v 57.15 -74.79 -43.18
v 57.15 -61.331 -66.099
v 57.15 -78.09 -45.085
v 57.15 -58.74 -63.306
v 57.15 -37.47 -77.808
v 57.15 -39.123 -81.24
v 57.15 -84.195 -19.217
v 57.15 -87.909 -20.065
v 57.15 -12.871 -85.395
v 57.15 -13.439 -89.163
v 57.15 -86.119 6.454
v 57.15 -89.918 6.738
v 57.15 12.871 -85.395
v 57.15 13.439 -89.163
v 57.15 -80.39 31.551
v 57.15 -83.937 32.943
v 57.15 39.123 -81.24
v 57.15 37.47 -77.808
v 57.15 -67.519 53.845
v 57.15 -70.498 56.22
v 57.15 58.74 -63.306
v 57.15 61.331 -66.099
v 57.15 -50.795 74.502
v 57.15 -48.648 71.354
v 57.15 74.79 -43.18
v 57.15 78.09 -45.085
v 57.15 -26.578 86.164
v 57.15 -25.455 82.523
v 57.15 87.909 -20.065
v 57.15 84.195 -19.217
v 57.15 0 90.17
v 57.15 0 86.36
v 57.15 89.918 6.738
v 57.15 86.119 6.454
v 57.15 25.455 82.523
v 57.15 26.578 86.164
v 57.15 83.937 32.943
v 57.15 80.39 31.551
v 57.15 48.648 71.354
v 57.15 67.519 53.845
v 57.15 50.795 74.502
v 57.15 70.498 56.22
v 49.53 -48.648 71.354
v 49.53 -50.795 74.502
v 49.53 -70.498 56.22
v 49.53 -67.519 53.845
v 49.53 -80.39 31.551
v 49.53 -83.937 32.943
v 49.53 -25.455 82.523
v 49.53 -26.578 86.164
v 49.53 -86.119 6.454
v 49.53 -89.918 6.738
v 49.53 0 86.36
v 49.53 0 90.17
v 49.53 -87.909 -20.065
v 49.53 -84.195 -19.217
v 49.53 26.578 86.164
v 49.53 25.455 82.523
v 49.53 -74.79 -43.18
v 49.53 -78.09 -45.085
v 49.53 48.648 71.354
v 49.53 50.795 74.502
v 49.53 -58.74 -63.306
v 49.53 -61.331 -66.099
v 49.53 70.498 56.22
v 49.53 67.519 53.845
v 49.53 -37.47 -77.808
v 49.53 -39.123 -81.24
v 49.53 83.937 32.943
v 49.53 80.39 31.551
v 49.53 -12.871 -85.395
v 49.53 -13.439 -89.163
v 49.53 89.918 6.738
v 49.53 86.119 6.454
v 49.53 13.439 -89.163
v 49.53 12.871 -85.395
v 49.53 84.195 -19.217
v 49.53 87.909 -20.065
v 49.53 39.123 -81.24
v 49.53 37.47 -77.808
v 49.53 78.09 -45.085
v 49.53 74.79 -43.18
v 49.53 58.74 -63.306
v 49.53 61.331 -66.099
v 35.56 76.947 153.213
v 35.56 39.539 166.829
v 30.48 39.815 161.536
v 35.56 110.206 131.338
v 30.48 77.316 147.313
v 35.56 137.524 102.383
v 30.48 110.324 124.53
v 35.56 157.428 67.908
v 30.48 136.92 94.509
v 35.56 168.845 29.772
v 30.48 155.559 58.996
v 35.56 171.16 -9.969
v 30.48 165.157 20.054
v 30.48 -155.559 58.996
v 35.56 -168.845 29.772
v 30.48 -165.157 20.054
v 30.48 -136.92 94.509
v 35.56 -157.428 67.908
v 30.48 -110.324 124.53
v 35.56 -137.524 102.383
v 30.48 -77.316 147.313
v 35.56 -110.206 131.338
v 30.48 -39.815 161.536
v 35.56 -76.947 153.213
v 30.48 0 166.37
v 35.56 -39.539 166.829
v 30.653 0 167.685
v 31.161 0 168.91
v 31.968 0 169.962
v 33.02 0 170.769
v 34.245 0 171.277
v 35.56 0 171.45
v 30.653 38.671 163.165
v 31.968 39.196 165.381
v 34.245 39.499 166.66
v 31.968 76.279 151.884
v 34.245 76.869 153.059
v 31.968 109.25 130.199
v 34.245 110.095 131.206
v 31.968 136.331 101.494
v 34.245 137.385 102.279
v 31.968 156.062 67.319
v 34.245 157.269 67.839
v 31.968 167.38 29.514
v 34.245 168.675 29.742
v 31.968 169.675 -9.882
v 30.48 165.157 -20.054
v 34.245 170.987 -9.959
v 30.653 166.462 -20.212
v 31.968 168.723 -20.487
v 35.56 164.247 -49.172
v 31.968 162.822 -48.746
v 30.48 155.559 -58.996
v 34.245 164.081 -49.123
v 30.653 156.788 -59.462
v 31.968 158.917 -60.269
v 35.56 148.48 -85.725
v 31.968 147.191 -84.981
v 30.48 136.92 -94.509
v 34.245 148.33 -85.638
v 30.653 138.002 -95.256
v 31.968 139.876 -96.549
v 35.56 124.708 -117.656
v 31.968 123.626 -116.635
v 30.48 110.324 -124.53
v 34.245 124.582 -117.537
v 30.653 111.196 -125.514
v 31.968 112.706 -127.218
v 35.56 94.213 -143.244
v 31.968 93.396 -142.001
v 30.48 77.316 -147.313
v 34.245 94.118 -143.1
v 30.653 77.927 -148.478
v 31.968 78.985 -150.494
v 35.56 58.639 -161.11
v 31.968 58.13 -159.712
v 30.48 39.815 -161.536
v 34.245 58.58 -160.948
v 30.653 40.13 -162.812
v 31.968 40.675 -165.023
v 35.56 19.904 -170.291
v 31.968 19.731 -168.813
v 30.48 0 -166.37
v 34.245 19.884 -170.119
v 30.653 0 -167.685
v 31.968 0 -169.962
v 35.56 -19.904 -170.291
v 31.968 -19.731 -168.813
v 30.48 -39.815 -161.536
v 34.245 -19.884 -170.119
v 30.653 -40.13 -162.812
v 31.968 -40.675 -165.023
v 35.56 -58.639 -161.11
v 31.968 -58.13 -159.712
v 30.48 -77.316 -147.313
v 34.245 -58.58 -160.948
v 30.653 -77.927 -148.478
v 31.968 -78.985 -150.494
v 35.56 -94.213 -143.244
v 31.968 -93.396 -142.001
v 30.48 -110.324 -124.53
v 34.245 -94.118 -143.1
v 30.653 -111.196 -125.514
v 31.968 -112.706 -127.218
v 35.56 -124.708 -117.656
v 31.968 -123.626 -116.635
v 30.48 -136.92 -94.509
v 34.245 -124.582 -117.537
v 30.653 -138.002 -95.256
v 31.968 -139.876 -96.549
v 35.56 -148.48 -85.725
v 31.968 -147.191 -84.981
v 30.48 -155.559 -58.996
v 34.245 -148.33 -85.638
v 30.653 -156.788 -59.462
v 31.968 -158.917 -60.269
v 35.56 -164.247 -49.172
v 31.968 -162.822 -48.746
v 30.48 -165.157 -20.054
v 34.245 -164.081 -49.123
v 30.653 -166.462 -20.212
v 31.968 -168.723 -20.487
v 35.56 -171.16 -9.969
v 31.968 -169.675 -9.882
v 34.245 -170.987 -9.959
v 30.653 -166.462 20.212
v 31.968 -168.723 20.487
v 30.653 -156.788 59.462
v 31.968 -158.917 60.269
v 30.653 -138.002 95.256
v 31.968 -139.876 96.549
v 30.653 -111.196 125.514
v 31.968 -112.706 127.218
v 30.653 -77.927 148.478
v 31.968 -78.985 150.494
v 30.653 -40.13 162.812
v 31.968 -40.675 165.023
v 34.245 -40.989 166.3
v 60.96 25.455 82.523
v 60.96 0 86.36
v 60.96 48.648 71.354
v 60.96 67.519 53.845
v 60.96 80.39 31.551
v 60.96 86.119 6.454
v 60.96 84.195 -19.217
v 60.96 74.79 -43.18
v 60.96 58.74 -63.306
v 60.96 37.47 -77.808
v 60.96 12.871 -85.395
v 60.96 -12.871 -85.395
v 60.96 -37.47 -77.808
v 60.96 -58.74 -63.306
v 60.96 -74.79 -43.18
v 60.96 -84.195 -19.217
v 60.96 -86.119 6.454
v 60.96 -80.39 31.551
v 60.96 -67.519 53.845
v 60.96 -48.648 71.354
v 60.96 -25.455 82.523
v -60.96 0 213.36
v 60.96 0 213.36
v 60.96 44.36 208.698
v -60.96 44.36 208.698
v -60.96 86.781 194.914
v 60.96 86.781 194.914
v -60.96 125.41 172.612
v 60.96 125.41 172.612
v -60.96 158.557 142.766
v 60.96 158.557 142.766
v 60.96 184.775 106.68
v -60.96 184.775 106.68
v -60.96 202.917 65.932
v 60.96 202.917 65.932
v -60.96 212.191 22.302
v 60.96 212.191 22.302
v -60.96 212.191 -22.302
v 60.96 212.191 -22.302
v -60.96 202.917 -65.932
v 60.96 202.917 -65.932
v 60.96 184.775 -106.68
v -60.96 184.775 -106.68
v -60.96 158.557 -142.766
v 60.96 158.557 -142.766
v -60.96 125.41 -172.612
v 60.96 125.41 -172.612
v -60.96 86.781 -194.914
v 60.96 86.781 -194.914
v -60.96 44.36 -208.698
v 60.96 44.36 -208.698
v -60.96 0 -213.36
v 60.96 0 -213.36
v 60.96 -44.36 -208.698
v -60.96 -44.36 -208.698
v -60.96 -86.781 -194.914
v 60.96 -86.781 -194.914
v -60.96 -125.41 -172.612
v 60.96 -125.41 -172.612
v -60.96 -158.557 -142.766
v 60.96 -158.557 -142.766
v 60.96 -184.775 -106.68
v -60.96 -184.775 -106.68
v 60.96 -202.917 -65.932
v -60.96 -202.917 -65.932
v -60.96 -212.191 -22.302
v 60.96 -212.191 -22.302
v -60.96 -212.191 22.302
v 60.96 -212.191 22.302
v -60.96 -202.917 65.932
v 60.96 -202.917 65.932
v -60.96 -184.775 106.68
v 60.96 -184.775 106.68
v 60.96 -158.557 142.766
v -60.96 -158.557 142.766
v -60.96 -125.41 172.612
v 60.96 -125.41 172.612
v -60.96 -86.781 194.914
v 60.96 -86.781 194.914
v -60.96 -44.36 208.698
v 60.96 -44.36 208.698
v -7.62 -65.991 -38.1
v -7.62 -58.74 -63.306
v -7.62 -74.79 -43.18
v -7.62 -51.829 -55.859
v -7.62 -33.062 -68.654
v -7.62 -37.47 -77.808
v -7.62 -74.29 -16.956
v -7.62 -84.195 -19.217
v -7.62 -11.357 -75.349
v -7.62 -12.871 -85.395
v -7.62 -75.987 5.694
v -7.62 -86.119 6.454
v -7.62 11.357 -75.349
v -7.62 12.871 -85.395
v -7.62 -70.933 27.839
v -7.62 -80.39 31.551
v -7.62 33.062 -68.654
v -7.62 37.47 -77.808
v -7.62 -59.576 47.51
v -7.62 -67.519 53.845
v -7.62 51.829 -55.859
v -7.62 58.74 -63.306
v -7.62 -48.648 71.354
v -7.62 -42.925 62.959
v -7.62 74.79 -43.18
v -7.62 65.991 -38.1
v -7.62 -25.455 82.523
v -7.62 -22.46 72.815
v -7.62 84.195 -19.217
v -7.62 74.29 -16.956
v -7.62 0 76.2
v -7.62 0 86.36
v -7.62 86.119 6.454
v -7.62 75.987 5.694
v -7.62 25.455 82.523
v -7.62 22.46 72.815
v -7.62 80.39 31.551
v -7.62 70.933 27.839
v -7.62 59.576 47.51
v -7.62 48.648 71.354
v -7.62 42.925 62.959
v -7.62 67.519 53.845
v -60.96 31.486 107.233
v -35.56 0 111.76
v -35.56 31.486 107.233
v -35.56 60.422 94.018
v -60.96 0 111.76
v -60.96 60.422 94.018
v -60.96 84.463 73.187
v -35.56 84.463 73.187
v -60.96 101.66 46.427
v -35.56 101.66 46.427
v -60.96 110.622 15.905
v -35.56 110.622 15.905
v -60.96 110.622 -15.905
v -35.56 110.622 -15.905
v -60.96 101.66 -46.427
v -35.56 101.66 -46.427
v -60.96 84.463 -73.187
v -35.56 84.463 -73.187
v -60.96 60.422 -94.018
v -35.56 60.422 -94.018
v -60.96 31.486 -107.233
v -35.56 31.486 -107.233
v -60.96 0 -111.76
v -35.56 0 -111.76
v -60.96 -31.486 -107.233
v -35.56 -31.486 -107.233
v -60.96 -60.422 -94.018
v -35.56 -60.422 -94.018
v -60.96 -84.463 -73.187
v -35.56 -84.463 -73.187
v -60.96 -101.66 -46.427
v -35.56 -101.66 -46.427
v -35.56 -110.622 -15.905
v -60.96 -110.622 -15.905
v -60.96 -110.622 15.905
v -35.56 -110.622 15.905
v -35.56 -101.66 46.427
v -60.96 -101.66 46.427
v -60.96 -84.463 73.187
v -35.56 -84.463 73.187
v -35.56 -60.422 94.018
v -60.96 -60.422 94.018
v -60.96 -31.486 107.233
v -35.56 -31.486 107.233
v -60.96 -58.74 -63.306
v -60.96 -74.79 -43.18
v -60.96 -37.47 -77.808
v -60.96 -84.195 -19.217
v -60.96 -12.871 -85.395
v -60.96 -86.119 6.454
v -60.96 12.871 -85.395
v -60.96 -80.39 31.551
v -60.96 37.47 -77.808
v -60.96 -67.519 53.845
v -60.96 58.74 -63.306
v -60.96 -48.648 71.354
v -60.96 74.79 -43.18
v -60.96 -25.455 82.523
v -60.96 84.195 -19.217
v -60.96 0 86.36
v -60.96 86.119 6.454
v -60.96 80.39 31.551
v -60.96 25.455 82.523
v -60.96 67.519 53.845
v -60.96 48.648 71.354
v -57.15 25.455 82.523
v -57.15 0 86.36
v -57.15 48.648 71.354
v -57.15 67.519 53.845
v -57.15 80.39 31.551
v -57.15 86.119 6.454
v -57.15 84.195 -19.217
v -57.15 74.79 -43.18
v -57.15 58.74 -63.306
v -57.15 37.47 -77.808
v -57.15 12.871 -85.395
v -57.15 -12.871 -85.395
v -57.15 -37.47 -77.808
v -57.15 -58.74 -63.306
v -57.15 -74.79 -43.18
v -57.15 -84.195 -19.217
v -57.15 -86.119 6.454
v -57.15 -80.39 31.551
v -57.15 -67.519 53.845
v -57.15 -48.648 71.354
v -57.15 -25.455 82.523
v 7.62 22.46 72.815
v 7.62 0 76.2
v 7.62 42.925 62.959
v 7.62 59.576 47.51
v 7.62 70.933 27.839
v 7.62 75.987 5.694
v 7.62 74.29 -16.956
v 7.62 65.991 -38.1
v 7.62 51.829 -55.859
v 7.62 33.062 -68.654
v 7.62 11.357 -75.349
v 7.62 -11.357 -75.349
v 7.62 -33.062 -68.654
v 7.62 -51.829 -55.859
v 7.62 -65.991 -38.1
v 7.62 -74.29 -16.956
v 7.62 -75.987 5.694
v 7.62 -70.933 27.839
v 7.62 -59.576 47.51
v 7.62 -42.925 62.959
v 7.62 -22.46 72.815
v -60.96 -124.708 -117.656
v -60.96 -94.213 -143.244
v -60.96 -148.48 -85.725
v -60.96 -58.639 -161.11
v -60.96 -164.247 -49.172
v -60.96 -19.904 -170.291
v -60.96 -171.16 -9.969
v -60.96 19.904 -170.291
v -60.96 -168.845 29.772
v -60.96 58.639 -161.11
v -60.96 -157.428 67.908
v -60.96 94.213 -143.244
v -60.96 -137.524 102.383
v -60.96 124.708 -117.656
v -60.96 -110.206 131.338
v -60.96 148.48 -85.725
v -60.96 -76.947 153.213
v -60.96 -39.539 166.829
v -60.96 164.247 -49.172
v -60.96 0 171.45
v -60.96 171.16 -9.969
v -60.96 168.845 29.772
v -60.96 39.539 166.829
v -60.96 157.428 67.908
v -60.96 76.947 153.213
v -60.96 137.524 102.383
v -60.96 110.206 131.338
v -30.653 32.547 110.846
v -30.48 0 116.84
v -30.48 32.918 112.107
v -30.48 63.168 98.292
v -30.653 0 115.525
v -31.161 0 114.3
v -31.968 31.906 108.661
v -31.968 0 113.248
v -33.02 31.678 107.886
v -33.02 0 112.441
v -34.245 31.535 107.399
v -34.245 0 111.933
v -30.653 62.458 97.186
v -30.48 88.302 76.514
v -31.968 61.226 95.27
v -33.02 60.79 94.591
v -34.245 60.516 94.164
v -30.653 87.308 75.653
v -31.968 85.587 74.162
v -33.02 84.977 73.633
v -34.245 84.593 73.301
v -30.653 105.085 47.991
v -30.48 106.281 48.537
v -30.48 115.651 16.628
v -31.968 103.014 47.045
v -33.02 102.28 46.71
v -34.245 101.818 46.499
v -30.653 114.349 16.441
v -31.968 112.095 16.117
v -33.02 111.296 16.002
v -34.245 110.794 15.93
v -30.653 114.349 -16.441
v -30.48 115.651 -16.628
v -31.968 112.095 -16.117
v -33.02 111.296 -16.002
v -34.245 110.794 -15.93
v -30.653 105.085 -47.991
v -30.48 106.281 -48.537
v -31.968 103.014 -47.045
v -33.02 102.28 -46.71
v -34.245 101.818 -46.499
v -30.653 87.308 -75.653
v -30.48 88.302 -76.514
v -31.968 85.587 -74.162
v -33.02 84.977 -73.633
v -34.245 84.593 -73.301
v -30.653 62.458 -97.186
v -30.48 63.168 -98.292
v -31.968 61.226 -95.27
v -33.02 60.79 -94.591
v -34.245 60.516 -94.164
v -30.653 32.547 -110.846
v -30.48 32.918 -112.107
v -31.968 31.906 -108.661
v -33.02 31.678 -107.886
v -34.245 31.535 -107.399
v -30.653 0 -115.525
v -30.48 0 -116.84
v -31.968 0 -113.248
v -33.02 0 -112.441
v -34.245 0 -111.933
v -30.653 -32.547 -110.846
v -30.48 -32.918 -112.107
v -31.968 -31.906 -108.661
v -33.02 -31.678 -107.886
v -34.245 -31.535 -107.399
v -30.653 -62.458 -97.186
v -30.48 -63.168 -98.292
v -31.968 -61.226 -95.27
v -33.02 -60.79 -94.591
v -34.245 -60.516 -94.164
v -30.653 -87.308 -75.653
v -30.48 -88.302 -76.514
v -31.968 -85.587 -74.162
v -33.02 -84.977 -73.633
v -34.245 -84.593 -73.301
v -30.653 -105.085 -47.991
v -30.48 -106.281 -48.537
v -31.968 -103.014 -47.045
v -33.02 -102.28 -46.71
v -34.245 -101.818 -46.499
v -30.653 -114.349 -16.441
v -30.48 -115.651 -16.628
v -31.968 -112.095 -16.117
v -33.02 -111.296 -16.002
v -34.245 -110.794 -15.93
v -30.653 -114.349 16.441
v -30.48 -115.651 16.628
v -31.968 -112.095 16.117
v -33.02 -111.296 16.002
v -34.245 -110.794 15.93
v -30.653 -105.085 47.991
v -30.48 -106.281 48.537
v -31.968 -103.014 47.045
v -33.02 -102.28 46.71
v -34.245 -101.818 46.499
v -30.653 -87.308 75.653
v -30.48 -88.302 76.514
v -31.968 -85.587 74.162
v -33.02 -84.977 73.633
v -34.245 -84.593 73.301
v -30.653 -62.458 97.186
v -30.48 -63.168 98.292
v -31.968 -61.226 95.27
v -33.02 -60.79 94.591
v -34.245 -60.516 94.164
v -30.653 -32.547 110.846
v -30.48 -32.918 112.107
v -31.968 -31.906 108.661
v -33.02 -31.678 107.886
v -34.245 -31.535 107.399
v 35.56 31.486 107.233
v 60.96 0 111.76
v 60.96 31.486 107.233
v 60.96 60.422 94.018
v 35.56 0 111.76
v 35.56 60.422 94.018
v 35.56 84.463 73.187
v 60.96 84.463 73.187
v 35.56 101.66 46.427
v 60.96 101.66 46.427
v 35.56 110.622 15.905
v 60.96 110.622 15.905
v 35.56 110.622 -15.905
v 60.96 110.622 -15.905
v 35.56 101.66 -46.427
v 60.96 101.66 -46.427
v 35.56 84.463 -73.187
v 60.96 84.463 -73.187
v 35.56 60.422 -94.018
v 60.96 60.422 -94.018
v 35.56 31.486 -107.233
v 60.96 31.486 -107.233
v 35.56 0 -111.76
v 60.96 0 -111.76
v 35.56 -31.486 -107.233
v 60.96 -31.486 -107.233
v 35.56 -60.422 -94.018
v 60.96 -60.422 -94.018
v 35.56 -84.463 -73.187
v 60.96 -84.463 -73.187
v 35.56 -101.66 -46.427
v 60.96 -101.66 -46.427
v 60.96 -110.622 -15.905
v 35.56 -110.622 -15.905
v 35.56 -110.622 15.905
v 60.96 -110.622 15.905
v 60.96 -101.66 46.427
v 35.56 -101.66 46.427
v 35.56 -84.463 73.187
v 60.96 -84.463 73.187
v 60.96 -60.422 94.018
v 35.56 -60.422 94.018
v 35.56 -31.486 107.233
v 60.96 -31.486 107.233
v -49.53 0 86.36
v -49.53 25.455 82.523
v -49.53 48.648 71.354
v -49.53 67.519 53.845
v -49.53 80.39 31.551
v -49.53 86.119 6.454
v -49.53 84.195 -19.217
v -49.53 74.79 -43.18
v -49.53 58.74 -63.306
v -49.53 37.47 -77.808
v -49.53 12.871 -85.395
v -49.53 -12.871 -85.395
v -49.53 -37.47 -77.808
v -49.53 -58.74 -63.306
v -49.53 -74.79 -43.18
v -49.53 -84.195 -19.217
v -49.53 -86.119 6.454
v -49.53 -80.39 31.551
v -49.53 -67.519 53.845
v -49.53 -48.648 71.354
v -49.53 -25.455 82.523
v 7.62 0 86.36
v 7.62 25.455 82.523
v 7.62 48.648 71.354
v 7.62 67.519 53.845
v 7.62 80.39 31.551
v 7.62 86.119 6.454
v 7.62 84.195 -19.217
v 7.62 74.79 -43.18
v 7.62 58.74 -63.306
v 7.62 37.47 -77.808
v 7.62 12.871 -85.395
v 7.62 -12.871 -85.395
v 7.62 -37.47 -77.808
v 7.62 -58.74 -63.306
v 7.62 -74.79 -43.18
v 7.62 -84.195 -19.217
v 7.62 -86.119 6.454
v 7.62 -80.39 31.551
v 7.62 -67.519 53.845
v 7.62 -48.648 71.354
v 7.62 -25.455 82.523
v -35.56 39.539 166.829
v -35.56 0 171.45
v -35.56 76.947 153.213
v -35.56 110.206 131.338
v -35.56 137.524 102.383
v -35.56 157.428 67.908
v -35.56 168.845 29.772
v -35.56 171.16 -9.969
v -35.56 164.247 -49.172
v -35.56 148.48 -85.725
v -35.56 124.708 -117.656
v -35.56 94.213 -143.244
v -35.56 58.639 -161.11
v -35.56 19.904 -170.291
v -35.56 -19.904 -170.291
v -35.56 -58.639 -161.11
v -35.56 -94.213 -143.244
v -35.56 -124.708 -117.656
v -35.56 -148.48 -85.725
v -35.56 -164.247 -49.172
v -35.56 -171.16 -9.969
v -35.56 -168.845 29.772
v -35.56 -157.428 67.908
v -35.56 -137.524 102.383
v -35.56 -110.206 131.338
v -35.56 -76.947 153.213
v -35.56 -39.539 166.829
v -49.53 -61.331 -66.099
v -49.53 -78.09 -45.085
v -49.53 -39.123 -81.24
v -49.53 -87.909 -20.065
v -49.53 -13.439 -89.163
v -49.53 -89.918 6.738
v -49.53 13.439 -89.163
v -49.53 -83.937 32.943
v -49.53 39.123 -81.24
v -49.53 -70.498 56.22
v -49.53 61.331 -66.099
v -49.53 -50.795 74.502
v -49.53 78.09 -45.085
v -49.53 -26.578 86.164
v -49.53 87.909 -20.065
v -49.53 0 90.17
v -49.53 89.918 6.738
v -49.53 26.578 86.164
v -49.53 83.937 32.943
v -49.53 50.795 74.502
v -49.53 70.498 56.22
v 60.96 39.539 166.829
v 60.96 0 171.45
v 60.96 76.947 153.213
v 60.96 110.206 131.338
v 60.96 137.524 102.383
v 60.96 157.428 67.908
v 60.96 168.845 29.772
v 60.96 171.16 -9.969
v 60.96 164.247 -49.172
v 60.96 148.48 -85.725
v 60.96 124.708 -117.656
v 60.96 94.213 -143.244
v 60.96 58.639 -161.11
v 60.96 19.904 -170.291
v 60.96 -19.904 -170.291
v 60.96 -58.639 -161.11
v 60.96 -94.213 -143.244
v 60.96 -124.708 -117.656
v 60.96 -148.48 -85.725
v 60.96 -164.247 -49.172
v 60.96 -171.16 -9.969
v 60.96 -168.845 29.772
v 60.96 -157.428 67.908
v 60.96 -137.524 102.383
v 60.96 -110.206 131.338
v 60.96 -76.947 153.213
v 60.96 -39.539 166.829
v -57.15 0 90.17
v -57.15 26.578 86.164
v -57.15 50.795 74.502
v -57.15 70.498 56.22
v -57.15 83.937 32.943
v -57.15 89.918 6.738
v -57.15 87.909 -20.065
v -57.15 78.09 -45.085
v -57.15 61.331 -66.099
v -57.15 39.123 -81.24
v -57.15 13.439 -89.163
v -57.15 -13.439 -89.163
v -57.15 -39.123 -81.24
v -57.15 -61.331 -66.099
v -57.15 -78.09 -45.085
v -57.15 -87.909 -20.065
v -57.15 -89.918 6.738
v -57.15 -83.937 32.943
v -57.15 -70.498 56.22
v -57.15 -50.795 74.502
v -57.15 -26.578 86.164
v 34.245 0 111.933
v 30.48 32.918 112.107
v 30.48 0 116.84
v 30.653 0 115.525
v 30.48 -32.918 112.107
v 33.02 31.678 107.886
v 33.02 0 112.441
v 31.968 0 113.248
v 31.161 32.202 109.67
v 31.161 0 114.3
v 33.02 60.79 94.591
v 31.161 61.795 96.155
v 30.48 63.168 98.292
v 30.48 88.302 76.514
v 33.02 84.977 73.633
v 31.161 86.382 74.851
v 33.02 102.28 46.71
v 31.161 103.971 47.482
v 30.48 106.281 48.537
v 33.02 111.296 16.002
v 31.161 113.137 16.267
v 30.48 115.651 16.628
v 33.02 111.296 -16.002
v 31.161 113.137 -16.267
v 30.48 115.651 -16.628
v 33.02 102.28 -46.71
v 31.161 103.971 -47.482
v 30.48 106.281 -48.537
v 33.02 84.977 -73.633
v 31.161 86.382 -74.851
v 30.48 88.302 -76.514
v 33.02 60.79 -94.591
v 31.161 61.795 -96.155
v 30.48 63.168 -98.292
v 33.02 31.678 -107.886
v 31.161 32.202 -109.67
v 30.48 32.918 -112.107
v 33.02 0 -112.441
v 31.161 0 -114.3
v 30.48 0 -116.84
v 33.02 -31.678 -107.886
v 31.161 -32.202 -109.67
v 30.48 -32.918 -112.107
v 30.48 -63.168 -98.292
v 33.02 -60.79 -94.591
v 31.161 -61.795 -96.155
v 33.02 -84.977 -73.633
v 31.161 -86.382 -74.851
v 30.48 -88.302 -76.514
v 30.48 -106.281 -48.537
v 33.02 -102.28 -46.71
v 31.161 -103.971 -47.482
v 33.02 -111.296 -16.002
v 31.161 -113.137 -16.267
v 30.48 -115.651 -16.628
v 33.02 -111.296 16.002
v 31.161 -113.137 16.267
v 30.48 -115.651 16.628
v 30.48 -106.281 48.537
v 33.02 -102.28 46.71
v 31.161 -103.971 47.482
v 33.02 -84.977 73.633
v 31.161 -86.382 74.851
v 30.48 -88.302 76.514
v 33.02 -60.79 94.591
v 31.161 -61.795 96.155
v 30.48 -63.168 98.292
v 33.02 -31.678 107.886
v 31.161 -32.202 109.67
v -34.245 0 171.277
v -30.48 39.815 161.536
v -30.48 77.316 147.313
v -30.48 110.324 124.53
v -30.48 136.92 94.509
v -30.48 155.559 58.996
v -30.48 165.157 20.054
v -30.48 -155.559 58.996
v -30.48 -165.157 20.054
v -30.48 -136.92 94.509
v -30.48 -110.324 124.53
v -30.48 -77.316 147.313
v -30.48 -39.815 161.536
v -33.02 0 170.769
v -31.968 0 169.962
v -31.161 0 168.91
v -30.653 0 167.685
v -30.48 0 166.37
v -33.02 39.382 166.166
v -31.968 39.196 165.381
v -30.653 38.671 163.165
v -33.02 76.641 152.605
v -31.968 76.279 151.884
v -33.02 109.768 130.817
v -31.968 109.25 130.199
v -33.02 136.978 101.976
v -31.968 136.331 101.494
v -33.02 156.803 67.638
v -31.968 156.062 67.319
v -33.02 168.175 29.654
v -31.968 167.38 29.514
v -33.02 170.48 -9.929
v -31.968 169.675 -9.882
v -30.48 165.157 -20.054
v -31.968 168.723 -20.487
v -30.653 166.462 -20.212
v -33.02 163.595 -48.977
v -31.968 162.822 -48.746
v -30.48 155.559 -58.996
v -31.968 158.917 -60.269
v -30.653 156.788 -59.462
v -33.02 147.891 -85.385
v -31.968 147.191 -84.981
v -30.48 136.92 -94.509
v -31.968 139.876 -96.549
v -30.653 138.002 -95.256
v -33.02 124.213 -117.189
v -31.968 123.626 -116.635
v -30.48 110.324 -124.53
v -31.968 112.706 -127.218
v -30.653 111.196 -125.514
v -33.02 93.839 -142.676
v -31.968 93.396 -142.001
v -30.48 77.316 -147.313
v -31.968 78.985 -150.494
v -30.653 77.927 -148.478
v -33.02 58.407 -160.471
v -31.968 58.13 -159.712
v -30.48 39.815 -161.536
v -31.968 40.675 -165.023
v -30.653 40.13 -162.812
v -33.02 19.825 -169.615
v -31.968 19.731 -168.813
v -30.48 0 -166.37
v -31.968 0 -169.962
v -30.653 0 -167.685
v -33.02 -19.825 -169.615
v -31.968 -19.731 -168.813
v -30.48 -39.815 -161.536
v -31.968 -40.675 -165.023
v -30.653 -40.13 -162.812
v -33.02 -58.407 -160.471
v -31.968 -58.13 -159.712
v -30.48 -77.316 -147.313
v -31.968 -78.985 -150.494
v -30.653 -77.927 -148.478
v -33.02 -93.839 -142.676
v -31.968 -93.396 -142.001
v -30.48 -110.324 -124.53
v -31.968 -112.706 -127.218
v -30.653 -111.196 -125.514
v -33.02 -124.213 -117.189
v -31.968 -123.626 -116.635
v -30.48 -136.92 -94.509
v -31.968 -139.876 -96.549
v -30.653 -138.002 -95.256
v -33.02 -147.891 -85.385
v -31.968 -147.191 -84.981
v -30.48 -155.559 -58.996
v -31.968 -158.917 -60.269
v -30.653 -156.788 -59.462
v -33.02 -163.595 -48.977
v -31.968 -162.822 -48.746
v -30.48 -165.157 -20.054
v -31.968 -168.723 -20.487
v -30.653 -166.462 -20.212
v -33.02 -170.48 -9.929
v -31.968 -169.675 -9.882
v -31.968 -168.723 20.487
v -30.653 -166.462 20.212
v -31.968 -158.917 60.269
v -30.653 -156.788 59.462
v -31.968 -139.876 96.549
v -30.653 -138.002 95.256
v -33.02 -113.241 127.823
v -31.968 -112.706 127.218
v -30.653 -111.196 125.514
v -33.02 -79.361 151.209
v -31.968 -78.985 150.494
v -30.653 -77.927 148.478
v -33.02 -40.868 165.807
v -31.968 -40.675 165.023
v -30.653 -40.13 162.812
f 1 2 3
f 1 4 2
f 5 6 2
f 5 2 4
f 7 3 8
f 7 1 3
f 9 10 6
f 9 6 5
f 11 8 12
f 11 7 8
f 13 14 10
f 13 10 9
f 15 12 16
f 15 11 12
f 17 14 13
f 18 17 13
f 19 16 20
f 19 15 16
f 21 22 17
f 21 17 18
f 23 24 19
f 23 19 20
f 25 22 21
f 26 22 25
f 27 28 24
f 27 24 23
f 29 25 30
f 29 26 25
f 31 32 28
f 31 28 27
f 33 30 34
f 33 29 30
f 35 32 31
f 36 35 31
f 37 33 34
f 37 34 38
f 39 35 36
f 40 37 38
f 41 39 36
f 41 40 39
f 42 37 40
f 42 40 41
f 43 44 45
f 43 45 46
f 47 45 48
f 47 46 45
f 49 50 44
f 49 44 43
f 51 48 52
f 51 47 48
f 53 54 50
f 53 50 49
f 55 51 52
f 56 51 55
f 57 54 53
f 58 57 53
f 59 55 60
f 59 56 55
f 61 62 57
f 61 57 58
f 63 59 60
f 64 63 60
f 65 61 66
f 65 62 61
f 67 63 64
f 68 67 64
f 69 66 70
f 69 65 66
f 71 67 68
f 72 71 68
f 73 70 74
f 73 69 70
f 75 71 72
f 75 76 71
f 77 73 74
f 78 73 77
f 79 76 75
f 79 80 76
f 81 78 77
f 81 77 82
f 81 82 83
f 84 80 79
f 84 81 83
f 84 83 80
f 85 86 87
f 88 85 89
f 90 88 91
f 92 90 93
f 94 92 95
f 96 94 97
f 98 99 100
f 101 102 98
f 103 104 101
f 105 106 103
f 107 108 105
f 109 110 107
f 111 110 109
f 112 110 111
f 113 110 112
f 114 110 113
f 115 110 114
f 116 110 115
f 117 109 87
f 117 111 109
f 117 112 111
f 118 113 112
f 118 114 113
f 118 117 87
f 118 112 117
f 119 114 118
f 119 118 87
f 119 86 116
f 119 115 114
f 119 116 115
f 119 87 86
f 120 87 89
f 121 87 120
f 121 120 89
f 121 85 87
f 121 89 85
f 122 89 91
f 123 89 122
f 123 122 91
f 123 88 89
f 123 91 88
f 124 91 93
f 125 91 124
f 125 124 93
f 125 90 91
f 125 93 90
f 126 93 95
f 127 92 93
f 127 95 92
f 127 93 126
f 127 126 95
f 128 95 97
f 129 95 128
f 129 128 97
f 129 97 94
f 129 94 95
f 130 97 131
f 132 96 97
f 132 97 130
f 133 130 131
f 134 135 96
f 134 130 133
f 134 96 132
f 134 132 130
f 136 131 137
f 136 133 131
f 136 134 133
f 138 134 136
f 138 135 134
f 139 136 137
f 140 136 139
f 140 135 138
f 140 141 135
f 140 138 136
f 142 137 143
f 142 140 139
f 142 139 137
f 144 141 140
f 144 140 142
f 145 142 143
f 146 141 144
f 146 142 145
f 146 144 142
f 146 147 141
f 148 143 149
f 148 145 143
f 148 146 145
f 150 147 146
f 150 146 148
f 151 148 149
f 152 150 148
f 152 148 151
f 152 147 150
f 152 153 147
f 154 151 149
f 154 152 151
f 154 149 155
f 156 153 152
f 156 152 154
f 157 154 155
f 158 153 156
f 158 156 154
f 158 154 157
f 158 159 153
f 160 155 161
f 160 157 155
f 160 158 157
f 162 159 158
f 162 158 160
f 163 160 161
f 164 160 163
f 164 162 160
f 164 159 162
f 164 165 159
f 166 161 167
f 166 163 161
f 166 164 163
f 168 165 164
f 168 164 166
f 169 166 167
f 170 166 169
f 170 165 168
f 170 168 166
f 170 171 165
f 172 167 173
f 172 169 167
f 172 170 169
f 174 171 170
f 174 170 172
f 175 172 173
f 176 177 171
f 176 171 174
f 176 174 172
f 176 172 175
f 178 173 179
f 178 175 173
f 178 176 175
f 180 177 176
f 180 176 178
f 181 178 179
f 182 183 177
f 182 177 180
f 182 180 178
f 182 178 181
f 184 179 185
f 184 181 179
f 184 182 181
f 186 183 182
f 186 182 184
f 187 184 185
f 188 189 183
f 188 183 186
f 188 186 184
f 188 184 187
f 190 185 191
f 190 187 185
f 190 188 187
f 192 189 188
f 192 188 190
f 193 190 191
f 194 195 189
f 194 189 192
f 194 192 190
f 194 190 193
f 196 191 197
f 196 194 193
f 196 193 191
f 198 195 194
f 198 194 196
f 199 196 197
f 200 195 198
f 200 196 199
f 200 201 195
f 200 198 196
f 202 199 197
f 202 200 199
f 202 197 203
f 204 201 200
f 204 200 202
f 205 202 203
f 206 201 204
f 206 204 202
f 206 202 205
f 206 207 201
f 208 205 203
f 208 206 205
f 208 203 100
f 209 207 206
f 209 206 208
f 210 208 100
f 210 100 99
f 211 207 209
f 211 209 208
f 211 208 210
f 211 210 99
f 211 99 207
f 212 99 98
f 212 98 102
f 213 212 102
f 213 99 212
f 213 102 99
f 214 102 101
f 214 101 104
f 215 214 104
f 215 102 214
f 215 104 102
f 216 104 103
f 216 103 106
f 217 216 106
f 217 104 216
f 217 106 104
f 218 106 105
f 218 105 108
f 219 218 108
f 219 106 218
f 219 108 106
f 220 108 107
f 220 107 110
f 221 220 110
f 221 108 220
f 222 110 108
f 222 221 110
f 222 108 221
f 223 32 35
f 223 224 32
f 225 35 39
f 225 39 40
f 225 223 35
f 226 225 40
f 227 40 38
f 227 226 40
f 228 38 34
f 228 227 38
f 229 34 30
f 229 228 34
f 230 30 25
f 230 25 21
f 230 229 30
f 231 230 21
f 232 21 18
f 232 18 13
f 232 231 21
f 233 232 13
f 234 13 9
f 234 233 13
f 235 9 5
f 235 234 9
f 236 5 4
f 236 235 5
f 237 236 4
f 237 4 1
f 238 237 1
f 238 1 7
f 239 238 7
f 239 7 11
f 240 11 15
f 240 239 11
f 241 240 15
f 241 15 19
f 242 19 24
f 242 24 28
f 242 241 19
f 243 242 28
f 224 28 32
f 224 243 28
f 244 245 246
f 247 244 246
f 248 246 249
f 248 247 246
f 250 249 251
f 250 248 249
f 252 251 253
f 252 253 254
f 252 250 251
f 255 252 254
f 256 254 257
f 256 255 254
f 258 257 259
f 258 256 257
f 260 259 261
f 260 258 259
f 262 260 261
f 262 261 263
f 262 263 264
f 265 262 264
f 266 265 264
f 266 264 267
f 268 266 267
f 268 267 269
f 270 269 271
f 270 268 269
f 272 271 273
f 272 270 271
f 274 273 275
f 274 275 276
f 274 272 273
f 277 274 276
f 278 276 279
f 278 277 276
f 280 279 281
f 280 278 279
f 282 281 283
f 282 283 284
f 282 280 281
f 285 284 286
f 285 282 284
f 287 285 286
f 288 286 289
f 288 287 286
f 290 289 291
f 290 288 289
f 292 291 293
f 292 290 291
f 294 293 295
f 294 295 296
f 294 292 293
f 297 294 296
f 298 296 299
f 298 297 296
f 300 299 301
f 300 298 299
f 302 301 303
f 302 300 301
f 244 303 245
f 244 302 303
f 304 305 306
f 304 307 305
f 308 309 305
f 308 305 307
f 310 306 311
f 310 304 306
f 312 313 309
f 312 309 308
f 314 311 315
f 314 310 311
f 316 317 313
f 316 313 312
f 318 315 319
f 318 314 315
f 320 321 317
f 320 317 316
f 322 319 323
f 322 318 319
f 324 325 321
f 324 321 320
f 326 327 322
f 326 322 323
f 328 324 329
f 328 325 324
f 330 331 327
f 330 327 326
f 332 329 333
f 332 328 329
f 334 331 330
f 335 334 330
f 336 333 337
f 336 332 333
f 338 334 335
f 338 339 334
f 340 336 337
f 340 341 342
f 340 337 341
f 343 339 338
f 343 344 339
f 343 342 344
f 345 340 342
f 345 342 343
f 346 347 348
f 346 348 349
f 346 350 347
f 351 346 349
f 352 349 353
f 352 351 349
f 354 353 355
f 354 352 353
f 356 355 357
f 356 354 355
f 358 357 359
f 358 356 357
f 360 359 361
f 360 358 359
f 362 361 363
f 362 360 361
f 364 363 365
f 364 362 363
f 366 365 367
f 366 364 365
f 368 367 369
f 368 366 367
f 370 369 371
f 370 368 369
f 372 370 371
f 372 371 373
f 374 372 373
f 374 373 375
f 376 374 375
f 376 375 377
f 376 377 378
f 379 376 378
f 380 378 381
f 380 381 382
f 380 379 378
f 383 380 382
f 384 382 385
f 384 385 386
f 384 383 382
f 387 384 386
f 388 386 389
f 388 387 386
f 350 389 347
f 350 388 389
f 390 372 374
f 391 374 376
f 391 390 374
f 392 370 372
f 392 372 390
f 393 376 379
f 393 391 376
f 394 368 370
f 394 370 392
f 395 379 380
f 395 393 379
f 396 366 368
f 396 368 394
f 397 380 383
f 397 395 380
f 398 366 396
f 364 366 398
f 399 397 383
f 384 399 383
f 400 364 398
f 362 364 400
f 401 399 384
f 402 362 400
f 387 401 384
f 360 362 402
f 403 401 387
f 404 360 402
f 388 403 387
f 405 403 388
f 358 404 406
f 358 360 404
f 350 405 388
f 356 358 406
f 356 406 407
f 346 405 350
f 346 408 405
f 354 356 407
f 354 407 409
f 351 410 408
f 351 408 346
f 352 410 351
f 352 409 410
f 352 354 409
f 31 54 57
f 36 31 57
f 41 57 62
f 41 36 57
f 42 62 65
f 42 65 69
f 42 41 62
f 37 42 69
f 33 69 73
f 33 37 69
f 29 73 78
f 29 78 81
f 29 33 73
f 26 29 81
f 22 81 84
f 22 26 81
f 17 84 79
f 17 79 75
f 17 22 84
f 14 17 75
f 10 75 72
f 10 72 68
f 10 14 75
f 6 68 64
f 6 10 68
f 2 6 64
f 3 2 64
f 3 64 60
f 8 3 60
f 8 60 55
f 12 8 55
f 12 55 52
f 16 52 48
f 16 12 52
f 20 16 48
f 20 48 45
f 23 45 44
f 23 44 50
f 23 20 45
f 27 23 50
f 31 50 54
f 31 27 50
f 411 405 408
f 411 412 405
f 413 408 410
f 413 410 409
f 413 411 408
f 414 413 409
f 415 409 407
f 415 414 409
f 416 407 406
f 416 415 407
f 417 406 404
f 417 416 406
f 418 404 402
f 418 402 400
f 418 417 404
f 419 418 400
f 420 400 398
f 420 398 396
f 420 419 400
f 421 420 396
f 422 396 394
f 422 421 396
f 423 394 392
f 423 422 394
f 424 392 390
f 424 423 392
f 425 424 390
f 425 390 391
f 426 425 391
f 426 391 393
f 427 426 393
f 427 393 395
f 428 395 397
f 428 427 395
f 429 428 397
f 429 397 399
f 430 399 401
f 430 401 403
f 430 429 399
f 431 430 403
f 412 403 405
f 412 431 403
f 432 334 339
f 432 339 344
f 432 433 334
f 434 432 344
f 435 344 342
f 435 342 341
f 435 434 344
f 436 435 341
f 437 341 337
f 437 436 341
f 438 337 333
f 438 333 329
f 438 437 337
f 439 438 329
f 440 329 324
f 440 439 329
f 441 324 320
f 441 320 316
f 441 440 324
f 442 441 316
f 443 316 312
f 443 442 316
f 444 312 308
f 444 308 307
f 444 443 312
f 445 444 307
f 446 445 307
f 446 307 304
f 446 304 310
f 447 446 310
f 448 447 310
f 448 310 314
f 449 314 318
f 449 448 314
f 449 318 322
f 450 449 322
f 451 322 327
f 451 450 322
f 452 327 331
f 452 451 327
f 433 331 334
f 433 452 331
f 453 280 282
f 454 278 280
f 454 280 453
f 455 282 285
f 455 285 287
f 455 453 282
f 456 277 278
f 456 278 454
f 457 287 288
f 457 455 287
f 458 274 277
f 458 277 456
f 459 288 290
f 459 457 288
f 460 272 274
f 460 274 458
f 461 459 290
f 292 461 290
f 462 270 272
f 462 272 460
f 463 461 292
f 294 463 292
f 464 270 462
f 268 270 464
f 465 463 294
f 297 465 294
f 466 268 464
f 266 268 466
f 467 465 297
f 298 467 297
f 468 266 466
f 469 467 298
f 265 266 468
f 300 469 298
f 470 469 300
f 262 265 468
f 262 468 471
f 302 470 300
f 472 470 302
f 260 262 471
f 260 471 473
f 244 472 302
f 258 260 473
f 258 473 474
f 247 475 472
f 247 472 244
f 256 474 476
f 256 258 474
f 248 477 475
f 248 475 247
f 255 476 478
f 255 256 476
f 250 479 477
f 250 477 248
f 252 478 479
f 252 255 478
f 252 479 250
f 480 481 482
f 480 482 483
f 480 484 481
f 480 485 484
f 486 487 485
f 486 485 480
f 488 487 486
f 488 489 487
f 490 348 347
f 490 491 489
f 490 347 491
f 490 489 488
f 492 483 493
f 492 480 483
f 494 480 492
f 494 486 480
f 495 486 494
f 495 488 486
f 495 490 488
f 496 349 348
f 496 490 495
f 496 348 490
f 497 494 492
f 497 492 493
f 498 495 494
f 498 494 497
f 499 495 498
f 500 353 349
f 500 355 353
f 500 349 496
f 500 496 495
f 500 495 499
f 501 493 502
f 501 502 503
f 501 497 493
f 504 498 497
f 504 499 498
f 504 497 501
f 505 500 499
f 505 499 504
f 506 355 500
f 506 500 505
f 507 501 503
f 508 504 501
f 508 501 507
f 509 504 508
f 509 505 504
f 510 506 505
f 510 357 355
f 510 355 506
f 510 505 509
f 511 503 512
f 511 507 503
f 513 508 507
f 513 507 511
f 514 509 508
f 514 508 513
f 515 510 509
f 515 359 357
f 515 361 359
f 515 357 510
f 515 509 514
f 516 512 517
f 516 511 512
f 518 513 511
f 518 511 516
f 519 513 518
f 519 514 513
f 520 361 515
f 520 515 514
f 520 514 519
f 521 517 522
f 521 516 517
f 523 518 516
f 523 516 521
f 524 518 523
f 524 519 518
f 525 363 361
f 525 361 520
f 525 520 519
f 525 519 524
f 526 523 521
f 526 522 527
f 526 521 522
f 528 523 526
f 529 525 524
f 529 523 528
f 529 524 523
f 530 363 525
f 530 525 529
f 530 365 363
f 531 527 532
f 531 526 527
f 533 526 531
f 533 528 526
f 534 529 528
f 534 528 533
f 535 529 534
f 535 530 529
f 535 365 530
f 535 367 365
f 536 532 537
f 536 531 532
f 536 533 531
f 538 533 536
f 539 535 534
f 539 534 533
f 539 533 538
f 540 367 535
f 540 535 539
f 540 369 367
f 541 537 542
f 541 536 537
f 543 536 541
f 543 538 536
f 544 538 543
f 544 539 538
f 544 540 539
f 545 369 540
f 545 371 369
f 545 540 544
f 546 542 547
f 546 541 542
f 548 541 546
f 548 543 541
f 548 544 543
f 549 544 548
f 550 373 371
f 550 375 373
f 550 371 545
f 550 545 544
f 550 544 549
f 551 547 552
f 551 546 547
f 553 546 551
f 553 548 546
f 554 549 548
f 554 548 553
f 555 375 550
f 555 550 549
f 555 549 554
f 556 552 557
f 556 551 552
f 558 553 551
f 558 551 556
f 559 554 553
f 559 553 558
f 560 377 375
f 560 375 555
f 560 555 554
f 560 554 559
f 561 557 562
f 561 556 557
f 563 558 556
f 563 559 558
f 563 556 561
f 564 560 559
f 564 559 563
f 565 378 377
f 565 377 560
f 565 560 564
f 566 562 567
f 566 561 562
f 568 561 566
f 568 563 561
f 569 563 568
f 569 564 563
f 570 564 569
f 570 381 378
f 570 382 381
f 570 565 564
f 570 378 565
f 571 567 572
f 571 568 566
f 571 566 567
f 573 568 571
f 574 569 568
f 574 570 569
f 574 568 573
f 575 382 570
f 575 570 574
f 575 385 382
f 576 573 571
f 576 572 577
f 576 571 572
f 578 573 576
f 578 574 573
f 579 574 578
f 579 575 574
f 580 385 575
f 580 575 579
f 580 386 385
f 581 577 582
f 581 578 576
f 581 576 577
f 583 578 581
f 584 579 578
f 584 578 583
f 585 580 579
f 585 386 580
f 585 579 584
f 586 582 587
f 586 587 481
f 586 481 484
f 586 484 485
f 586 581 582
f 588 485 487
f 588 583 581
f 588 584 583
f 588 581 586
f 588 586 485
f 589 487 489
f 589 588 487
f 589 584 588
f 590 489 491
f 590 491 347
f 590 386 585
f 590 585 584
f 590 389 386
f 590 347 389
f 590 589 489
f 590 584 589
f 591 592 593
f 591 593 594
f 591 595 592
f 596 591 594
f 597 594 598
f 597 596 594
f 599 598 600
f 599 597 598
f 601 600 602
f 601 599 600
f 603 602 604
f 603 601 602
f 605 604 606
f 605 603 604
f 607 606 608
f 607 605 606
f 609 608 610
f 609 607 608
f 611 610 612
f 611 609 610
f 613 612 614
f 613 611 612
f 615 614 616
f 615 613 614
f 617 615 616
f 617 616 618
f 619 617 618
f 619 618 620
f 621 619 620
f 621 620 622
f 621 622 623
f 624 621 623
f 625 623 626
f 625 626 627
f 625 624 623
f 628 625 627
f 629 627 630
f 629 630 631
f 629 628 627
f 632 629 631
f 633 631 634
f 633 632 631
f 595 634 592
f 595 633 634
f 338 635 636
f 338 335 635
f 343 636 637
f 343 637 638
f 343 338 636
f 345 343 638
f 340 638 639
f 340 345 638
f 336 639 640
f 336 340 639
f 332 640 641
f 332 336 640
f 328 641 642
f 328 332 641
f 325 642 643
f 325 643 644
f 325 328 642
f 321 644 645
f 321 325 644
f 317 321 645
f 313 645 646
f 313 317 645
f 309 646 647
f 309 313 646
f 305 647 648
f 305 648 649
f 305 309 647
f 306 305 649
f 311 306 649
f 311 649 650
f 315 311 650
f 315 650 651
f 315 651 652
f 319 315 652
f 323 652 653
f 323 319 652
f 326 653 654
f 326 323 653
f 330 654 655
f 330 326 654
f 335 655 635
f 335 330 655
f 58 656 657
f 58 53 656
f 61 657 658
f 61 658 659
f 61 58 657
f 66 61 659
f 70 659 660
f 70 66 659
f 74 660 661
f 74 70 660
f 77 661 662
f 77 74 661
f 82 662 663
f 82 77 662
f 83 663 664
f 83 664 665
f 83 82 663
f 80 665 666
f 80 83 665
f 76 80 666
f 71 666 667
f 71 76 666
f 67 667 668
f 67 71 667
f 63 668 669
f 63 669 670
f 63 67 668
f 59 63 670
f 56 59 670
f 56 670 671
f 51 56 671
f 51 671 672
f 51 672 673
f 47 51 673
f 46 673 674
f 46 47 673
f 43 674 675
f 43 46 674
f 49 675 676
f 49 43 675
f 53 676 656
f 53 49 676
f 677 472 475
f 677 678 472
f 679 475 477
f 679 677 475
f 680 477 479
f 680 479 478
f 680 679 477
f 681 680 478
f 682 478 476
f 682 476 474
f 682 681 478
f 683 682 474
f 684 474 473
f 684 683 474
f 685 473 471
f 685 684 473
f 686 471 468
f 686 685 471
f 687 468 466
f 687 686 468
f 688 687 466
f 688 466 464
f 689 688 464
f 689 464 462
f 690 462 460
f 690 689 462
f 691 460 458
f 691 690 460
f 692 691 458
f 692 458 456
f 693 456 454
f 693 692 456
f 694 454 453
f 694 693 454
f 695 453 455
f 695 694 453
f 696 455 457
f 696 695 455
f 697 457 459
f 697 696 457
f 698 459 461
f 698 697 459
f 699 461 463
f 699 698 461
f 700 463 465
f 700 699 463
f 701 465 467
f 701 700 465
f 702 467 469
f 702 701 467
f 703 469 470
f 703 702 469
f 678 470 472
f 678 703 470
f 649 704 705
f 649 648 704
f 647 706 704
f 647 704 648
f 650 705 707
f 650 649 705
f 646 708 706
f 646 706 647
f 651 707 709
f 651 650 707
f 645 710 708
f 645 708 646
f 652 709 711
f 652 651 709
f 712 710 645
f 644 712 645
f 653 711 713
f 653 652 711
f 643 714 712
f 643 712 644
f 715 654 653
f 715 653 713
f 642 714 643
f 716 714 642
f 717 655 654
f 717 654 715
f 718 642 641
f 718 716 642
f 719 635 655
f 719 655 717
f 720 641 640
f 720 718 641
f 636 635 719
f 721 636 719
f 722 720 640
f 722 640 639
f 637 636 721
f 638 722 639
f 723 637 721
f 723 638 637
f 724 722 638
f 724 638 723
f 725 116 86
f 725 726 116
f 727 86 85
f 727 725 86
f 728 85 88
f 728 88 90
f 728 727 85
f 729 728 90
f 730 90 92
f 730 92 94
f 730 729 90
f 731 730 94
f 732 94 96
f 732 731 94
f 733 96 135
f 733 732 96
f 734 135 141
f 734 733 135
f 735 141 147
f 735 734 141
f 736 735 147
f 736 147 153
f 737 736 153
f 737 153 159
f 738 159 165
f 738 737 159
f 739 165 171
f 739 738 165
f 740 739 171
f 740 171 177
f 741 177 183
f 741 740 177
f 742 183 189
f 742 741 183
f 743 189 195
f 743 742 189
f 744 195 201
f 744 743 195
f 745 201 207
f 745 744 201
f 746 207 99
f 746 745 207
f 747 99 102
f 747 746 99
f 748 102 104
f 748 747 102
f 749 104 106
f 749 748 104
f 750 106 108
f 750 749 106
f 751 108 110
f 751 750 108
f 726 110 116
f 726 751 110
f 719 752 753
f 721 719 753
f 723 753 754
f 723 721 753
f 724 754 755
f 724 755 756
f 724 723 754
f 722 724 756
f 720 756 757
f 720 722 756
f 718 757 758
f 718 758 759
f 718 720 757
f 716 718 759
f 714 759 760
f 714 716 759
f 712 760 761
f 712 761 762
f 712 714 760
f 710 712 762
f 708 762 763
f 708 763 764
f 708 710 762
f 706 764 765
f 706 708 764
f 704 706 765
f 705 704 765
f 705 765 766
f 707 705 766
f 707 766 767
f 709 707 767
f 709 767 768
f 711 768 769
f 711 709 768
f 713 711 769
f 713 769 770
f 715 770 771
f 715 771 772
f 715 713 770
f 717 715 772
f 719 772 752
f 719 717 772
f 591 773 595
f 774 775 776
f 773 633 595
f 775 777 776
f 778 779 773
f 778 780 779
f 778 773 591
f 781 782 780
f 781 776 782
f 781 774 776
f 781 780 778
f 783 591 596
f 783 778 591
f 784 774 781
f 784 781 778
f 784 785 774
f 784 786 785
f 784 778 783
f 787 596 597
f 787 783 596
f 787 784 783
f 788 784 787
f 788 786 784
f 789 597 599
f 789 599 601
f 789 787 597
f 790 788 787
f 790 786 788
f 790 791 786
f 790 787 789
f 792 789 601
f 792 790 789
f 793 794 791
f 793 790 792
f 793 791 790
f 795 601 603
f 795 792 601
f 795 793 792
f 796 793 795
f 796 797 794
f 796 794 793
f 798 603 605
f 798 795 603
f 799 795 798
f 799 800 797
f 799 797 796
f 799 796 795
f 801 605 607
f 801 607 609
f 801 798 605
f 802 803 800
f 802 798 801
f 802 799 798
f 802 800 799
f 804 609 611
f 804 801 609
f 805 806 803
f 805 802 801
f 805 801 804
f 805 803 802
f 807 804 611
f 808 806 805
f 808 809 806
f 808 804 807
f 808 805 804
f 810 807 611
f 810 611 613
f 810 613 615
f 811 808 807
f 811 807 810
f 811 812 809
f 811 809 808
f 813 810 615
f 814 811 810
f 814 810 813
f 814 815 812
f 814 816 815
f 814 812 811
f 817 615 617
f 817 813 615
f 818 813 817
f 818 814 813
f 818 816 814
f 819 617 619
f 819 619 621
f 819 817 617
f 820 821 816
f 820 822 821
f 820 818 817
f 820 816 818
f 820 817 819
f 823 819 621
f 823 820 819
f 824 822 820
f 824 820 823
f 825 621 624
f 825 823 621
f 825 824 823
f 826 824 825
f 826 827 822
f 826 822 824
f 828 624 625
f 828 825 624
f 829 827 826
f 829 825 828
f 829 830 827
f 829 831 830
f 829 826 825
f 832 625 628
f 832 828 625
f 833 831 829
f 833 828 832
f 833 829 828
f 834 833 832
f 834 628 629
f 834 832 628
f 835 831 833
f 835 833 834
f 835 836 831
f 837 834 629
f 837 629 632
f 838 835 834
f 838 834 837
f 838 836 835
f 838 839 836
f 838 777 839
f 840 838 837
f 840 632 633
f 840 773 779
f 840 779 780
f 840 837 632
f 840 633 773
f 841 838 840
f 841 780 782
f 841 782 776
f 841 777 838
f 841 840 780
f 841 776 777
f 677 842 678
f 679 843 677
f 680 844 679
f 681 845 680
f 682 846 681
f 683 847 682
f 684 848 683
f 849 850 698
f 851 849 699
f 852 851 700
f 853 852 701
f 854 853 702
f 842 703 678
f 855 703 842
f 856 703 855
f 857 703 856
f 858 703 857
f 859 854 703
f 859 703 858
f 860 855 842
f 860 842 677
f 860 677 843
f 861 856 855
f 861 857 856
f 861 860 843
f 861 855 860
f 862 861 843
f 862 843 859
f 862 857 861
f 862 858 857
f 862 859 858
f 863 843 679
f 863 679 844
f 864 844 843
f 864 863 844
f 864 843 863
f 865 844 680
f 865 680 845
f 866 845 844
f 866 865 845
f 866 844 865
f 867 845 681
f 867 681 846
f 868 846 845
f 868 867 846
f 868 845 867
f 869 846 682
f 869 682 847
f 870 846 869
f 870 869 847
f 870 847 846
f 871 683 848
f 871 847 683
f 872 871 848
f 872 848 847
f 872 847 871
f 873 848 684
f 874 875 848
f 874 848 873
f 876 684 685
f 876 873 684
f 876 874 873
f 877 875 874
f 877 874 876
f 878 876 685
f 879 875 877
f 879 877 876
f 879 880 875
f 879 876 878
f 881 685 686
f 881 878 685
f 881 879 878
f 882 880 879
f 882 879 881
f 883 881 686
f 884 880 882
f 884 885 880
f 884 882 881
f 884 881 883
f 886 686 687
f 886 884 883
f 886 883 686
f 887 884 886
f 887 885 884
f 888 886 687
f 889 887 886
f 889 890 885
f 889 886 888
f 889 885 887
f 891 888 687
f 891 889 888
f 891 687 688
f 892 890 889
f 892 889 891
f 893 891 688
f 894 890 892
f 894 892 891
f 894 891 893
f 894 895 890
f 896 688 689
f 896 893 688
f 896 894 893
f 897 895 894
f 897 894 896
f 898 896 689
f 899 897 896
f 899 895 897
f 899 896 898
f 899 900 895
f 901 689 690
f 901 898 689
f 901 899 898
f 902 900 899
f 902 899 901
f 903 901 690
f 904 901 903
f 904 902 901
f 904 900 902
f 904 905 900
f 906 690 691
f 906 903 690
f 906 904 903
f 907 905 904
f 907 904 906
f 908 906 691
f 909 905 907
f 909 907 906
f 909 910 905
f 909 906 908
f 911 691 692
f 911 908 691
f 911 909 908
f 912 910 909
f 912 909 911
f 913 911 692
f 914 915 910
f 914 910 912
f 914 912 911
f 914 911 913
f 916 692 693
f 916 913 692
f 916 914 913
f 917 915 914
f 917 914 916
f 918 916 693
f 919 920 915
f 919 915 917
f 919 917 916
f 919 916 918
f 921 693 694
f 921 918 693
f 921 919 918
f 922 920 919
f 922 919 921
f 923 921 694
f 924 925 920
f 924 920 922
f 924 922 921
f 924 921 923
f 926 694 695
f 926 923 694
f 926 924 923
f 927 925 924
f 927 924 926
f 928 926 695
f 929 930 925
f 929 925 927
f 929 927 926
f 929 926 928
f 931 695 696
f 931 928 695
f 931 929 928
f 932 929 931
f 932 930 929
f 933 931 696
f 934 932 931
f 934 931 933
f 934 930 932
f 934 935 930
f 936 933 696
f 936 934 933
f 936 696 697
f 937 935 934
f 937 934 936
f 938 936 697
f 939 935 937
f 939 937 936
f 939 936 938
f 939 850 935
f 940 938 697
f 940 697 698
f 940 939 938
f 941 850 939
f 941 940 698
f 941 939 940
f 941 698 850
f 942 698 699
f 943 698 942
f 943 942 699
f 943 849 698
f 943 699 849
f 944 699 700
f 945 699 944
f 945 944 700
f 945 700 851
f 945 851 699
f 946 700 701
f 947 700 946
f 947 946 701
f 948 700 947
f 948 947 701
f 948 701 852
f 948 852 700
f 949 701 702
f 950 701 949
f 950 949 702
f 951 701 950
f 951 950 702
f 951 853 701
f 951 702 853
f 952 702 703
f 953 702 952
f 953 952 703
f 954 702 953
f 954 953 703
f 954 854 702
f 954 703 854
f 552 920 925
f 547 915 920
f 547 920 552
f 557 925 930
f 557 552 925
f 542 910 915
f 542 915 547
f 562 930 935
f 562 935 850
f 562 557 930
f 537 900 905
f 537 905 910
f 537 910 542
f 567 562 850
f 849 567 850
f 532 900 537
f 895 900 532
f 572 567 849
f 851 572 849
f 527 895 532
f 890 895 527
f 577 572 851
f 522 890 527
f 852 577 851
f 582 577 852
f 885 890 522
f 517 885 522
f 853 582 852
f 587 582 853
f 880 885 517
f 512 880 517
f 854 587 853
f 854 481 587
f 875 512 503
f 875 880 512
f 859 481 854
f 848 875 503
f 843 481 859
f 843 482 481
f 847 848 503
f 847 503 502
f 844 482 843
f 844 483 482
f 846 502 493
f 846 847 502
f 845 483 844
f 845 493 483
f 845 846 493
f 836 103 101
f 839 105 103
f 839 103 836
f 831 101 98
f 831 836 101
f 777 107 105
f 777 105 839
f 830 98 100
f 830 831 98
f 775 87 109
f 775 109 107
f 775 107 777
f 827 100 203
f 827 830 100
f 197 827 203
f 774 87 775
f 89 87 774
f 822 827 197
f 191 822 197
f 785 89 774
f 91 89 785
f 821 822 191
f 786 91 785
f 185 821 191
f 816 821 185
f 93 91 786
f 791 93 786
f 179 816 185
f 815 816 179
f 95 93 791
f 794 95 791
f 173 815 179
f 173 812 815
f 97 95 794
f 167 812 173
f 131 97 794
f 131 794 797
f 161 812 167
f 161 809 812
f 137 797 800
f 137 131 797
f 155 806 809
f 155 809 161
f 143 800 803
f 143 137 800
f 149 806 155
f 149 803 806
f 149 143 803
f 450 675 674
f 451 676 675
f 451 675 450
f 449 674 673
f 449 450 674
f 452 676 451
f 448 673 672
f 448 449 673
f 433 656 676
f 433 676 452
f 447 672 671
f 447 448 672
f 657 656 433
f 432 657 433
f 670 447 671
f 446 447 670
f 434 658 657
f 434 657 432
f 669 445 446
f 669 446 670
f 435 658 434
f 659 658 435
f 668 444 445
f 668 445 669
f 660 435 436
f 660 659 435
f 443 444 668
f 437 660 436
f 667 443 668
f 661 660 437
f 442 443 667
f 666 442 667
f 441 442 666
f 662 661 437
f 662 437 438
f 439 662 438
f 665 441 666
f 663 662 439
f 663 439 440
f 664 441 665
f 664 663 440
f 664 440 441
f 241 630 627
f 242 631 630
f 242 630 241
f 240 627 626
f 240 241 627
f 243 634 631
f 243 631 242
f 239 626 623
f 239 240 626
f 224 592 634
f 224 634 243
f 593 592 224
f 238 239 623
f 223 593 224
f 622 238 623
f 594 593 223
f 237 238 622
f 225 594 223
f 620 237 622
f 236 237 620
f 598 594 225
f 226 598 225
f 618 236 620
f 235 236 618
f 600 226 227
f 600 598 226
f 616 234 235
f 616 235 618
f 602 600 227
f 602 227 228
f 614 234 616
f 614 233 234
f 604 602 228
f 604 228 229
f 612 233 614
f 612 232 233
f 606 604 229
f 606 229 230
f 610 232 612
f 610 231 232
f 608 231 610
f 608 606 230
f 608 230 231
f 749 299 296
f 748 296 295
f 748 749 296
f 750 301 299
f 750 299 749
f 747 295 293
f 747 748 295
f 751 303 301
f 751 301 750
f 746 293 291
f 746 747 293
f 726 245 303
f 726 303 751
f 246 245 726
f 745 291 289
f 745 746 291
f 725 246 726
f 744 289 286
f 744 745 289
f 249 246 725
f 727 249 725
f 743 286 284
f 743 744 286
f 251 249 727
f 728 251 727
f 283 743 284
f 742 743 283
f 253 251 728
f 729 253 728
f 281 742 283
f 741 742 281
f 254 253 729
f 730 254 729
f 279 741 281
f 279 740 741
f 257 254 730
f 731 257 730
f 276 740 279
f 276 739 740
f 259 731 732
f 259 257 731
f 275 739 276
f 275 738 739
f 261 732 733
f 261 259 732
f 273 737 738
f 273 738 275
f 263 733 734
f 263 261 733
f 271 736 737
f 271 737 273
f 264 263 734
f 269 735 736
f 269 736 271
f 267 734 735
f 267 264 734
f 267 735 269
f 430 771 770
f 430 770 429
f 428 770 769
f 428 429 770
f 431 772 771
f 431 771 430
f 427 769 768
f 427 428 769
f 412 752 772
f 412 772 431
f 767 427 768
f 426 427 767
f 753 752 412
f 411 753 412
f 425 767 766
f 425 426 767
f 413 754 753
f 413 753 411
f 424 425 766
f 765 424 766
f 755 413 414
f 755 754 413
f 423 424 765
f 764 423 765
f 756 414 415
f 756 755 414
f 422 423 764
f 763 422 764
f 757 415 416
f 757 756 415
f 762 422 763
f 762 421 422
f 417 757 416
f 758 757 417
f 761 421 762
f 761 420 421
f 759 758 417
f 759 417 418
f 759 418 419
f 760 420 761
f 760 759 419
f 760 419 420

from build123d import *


with BuildPart() as f1:
    # F0 (on Front) → F1 (revolve)
    with BuildSketch(Plane.XZ):
        with BuildLine():
            Line((0, 76.2), (0, 213.36))
            Line((0, 213.36), (-60.96, 213.36))
            Line((-60.96, 213.36), (-60.96, 171.45))
            Line((-60.96, 171.45), (-35.56, 171.45))
            ThreePointArc((-35.56, 171.45), (-31.967898, 169.962102), (-30.48, 166.37))
            Line((-30.48, 166.37), (-30.48, 116.84))
            ThreePointArc((-30.48, 116.84), (-31.967898, 113.247898), (-35.56, 111.76))
            Line((-35.56, 111.76), (-60.96, 111.76))
            Line((-60.96, 111.76), (-60.96, 86.36))
            Line((-60.96, 86.36), (-57.15, 86.36))
            Line((-57.15, 86.36), (-57.15, 90.17))
            Line((-57.15, 90.17), (-49.53, 90.17))
            Line((-49.53, 90.17), (-49.53, 86.36))
            Line((-49.53, 86.36), (-7.62, 86.36))
            Line((-7.62, 86.36), (-7.62, 76.2))
            Line((-7.62, 76.2), (0, 76.2))
        make_face()
        with BuildLine():
            Line((60.96, 213.36), (0, 213.36))
            Line((0, 213.36), (0, 76.2))
            Line((0, 76.2), (7.62, 76.2))
            Line((7.62, 76.2), (7.62, 86.36))
            Line((7.62, 86.36), (49.53, 86.36))
            Line((49.53, 86.36), (49.53, 90.17))
            Line((49.53, 90.17), (57.15, 90.17))
            Line((57.15, 90.17), (57.15, 86.36))
            Line((57.15, 86.36), (60.96, 86.36))
            Line((60.96, 86.36), (60.96, 111.76))
            Line((60.96, 111.76), (35.56, 111.76))
            ThreePointArc((35.56, 111.76), (31.967898, 113.247898), (30.48, 116.84))
            Line((30.48, 116.84), (30.48, 166.37))
            ThreePointArc((30.48, 166.37), (31.967898, 169.962102), (35.56, 171.45))
            Line((35.56, 171.45), (60.96, 171.45))
            Line((60.96, 171.45), (60.96, 213.36))
        make_face()
    revolve(axis=Axis((-30.48, 0, 0), (-1, 0, 0)))


solid = f1.part
